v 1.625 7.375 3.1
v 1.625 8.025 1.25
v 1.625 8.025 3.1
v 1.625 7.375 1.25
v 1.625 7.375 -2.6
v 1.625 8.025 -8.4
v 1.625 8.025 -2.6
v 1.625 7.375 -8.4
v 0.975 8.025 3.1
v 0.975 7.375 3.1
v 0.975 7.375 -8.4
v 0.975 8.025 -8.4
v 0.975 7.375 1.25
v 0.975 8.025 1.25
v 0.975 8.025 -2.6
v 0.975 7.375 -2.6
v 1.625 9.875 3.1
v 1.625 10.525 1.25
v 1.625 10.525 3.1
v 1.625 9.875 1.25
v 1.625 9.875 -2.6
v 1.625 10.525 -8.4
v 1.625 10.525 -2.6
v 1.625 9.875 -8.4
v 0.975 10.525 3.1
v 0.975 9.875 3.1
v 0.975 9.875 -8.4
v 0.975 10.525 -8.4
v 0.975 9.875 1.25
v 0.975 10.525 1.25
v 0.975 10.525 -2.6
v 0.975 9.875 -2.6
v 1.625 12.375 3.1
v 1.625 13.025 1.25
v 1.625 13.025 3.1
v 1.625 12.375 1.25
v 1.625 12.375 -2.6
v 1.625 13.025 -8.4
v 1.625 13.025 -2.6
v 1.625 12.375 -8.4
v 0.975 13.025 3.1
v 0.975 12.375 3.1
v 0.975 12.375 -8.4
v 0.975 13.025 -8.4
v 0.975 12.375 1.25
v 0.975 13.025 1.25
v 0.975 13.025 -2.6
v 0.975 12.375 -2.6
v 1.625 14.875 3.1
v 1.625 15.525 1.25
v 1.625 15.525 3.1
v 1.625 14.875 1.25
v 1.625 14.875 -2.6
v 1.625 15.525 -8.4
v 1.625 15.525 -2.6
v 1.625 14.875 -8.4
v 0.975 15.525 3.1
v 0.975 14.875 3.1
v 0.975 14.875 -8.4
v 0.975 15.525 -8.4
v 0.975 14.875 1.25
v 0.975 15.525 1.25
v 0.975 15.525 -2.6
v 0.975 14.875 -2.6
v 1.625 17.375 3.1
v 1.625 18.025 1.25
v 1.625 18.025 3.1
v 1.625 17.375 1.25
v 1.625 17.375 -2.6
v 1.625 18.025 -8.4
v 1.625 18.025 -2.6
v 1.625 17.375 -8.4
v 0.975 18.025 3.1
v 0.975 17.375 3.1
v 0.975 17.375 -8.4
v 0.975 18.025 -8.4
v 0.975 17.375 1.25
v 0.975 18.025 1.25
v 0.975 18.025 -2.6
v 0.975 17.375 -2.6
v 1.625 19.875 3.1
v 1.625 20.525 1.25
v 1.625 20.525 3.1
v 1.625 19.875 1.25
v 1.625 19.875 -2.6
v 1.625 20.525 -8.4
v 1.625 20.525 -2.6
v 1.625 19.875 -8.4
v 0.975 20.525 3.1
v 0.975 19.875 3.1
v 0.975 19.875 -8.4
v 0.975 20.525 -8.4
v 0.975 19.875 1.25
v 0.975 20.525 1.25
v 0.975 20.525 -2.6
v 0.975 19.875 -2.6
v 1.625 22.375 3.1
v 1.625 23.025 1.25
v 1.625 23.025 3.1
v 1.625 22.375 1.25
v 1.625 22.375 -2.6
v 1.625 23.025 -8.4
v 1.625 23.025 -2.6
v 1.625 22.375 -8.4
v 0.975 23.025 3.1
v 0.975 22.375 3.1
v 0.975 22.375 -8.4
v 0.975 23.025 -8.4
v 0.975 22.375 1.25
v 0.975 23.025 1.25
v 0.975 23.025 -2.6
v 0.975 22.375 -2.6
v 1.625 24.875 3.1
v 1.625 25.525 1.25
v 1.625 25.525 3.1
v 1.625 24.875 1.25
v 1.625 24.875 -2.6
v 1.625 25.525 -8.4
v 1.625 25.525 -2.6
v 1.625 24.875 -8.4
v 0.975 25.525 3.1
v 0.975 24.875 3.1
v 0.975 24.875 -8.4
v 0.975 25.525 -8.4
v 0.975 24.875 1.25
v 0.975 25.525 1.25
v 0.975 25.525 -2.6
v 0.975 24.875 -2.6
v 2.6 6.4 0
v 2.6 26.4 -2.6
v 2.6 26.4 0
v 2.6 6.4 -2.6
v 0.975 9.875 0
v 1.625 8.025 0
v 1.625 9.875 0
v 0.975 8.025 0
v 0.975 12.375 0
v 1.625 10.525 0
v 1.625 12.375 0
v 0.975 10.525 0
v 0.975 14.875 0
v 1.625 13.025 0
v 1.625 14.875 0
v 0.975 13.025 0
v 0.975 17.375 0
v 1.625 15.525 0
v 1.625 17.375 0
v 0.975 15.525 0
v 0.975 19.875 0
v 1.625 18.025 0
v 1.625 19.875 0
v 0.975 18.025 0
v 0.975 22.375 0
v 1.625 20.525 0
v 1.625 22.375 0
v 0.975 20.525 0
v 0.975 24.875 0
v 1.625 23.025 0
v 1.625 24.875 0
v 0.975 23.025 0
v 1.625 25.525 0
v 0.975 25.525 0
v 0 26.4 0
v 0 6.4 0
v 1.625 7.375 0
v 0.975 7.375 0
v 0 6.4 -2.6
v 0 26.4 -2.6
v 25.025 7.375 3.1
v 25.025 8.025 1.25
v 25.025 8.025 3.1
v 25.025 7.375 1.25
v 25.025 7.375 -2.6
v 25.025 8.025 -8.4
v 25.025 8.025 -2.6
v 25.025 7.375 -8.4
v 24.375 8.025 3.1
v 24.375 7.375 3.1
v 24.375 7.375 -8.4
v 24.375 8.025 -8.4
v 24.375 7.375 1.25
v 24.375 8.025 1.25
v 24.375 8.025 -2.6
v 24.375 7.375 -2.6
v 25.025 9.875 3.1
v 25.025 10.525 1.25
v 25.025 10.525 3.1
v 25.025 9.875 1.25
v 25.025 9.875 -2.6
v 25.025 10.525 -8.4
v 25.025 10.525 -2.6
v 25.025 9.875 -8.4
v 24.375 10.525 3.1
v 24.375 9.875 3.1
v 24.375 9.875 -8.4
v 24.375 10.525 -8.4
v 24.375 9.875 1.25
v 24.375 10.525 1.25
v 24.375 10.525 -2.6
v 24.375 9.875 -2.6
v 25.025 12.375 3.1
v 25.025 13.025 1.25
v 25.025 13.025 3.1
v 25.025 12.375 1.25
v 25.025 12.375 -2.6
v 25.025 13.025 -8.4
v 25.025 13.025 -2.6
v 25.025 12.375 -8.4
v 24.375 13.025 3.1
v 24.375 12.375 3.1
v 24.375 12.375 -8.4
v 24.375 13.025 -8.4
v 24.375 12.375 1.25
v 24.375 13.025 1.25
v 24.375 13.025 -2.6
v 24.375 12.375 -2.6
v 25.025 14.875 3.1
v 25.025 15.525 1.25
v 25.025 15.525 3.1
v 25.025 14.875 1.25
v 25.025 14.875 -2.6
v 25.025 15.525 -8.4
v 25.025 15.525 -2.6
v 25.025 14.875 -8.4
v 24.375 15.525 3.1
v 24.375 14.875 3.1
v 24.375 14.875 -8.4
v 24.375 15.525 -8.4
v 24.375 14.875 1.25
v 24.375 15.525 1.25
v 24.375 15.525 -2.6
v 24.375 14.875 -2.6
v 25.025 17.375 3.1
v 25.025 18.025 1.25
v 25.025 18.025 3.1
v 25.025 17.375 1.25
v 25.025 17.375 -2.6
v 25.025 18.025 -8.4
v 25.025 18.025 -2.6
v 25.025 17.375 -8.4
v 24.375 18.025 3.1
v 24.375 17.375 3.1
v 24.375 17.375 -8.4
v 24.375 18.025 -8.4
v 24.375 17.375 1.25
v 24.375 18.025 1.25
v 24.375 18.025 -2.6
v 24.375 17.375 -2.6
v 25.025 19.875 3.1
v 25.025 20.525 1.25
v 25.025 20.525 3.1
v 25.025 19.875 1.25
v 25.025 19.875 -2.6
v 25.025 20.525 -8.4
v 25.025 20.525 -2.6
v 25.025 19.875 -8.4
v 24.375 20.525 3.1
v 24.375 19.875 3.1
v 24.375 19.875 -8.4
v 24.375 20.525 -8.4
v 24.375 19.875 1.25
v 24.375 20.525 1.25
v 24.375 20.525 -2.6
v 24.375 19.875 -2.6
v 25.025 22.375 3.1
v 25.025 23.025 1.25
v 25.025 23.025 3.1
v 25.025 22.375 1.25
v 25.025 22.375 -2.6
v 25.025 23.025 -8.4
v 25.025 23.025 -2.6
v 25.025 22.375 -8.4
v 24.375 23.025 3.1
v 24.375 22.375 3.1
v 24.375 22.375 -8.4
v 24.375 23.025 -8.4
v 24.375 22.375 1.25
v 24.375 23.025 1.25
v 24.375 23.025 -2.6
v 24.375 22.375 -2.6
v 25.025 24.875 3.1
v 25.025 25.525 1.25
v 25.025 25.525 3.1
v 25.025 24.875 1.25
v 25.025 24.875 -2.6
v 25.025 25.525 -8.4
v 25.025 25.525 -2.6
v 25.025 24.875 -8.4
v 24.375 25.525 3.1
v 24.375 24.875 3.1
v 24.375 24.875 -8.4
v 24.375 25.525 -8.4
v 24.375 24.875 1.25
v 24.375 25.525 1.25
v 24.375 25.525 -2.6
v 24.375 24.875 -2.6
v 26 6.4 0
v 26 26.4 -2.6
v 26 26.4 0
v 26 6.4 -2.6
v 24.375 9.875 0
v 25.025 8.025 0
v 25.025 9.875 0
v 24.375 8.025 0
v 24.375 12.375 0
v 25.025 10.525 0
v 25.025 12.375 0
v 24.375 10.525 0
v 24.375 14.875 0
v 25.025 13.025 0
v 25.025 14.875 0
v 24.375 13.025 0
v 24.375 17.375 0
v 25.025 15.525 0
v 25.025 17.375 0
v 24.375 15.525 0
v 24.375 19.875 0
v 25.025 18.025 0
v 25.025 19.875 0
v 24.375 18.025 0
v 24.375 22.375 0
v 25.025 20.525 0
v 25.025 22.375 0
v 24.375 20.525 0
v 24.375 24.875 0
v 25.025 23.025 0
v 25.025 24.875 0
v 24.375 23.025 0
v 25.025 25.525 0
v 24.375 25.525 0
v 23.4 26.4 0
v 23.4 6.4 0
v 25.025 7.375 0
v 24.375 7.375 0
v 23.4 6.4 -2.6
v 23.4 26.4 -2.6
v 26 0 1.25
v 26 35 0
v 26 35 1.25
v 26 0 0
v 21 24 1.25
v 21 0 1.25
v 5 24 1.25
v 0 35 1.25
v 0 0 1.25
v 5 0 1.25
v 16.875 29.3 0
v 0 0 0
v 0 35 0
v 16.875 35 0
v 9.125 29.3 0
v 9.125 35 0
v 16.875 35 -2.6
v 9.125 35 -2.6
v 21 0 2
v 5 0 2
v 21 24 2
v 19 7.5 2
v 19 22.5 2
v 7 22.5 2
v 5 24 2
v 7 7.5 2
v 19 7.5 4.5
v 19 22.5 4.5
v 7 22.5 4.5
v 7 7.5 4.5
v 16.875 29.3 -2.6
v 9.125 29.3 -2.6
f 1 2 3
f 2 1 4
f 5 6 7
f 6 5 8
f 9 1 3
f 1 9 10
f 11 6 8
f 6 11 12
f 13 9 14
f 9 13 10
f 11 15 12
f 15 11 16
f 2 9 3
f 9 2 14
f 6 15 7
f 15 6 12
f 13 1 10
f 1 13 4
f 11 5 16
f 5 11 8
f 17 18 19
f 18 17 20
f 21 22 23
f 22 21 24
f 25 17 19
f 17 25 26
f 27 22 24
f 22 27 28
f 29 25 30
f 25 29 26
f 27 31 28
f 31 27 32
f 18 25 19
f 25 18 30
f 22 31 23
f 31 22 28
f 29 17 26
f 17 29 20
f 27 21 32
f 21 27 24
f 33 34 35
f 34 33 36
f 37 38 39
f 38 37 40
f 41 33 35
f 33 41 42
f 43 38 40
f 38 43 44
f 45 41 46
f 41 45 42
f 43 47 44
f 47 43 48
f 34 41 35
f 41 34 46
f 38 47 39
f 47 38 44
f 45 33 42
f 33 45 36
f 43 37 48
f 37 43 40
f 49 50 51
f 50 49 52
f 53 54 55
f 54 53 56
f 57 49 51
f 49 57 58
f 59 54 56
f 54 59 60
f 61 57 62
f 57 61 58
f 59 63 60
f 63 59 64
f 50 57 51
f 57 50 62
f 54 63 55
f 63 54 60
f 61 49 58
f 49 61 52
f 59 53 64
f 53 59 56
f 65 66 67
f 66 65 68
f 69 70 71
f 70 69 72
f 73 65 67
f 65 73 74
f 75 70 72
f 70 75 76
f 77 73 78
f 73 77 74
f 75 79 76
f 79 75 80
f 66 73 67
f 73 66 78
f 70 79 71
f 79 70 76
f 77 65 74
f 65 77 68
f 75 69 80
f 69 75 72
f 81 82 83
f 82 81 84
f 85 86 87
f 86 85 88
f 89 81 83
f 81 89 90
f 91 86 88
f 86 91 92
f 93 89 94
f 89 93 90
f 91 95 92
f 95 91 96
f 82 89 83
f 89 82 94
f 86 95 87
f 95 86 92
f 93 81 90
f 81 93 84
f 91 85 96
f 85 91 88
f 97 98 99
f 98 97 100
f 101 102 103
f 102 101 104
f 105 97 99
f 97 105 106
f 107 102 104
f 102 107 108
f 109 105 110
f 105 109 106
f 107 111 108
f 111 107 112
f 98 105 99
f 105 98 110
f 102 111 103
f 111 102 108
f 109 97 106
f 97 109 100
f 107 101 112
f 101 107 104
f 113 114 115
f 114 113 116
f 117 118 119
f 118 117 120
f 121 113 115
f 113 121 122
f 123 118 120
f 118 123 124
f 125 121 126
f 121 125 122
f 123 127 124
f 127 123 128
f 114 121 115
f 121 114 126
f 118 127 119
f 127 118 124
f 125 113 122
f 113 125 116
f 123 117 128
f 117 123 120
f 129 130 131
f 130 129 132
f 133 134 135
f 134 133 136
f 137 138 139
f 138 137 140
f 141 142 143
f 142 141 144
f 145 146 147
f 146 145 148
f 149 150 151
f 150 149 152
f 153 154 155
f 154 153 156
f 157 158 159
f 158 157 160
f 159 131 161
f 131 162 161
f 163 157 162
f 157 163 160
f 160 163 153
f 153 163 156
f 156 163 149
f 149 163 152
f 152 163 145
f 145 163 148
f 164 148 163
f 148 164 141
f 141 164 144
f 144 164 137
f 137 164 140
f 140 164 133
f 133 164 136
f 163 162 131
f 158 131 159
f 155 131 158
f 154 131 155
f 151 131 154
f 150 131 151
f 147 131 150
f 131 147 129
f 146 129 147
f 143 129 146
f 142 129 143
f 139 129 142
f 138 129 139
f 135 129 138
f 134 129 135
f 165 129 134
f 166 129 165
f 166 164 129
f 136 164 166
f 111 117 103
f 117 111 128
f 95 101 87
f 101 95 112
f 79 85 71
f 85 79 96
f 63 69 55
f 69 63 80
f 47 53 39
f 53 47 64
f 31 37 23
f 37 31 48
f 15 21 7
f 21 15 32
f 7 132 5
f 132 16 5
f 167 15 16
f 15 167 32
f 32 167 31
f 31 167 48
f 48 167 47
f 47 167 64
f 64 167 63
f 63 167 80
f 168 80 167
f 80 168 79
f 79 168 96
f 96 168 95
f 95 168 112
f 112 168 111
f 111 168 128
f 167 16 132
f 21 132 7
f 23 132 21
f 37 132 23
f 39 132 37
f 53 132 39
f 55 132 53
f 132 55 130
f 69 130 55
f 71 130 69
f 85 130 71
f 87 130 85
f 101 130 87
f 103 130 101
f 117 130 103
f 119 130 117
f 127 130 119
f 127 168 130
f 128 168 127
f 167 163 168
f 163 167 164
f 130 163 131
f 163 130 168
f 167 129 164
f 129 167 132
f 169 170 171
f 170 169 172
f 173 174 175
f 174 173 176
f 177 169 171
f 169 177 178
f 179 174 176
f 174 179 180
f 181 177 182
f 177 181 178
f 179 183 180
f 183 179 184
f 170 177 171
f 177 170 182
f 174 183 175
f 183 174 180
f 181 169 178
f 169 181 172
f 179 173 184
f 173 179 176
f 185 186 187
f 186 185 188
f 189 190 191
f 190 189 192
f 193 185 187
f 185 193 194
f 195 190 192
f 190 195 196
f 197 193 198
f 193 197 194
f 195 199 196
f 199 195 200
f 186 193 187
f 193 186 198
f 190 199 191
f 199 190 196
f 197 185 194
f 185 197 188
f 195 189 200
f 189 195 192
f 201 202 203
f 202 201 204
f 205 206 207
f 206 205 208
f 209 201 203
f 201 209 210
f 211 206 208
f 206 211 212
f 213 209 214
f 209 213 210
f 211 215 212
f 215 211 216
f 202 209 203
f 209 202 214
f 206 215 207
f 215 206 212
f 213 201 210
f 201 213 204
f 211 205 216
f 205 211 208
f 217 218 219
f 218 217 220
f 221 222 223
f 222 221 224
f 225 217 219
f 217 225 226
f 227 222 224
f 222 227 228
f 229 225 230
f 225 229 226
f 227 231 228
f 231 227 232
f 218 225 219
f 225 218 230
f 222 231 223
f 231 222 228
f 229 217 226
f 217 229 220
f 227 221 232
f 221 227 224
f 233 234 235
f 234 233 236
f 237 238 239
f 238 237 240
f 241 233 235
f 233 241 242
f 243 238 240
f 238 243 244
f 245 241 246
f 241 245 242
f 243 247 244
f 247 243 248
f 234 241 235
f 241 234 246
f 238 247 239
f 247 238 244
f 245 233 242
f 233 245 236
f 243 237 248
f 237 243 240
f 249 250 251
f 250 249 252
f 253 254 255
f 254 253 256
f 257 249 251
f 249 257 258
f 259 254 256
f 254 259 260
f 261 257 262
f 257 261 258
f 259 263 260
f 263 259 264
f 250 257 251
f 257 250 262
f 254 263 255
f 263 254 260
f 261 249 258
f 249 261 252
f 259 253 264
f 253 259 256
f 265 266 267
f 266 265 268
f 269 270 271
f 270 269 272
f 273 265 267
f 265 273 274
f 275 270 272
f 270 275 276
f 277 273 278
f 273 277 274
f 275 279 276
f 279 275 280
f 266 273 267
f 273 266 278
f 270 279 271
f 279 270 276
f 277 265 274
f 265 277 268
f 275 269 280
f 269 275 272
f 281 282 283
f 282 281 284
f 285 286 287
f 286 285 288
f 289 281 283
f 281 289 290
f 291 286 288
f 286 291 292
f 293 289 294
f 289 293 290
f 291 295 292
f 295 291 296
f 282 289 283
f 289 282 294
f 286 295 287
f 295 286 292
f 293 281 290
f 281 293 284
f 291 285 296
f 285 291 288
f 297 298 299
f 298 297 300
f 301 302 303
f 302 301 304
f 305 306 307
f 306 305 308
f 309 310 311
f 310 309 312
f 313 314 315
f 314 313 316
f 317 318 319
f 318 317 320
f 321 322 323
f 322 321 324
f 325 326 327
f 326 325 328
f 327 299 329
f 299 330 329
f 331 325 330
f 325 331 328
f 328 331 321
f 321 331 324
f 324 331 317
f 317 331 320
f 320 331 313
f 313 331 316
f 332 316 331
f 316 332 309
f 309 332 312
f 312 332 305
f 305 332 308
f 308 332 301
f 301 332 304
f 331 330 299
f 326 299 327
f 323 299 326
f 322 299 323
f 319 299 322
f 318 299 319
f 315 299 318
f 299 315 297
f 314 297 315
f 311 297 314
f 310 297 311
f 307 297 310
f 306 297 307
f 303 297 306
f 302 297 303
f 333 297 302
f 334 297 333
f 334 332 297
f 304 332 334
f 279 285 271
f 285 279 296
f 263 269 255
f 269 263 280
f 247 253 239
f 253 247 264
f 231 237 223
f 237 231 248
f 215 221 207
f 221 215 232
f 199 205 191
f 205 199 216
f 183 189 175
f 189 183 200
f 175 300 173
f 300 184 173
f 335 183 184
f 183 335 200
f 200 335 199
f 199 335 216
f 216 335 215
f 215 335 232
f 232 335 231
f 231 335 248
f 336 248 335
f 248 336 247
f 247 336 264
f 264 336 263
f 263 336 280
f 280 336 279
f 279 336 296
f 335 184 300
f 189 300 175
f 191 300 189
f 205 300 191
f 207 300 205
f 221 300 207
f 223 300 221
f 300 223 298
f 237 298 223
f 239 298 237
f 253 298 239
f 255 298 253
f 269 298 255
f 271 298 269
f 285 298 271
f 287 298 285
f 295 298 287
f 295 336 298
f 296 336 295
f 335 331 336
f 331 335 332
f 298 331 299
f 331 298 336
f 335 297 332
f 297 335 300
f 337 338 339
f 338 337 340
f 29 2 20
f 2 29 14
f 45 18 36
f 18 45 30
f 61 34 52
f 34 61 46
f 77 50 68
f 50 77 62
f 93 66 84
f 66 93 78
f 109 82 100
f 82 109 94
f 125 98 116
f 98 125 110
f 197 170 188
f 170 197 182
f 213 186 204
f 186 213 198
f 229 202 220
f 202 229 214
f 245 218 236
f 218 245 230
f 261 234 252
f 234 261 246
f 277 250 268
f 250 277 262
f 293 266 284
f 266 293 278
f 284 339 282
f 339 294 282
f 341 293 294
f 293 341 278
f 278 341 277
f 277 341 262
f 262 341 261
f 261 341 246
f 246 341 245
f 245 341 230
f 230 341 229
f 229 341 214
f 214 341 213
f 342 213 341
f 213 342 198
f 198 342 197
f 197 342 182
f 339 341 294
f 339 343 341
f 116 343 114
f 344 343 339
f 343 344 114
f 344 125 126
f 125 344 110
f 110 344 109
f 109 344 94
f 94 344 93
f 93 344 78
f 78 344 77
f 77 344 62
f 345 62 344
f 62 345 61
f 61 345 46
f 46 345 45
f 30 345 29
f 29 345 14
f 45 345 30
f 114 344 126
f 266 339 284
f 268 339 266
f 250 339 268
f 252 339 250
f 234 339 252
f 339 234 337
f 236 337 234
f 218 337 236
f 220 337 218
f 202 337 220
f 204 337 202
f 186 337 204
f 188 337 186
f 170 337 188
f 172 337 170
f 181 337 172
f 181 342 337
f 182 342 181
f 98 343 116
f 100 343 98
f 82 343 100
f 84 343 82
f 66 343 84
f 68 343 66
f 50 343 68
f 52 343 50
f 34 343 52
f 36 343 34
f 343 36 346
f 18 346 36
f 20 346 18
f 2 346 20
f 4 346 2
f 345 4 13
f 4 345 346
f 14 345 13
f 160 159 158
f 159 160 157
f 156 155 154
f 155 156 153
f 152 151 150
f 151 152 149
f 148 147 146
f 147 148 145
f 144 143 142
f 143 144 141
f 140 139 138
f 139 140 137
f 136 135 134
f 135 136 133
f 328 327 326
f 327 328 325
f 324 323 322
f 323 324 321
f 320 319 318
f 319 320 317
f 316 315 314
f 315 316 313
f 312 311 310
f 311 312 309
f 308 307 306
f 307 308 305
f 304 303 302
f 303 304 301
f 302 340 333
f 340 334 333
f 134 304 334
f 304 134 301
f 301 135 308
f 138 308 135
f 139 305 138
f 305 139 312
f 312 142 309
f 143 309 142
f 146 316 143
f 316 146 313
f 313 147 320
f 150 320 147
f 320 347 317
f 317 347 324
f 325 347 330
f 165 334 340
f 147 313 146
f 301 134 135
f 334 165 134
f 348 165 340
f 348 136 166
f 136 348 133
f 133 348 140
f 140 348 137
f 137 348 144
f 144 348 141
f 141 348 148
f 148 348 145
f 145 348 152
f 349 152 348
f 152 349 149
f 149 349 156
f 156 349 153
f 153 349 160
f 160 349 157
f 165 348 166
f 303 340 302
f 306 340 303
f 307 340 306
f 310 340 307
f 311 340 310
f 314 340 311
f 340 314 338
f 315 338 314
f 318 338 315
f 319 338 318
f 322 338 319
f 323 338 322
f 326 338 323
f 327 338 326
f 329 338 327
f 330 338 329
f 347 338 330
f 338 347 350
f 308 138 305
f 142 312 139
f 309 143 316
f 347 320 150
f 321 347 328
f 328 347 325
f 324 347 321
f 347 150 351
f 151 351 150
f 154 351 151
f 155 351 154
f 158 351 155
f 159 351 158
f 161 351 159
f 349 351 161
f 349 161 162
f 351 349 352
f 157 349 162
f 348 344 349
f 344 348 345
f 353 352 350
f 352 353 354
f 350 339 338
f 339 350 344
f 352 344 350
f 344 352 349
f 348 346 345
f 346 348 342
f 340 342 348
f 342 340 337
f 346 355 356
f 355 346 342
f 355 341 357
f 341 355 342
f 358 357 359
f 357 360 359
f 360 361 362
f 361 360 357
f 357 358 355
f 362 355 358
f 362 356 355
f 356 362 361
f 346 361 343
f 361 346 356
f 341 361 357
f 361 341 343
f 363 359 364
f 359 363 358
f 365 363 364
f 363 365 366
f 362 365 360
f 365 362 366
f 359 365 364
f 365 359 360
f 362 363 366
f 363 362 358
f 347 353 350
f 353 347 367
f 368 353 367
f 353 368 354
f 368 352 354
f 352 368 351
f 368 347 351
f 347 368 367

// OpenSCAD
cpu(); 

module cpu() {
  color("teal") cube([26,35,1.25]);
  color("black") translate([5,0,1.25]) cube([16,24,0.75]);
  color("silver") translate([7,7.5,2]) cube([12,15,2.5]);
  color("silver") translate([(26-7.75)/2,35-5.7,-2.6]) cube([7.75,5.7,2.6]);


  translate([0,6.4,-2.6]) pins();
  translate([26-2.6,6.4,-2.6]) pins();
}

module pins() {
  d=17.5/7;
  o=(2.6-0.65)/2;
  color("silver") 
  for( i = [ 0: 7]) {
    translate([o,i*d+o,-5.8]) cube([0.65,0.65,11.5]);
  }
  color("black") translate([0,0,0]) cube([2.6,20,2.6]);
}
